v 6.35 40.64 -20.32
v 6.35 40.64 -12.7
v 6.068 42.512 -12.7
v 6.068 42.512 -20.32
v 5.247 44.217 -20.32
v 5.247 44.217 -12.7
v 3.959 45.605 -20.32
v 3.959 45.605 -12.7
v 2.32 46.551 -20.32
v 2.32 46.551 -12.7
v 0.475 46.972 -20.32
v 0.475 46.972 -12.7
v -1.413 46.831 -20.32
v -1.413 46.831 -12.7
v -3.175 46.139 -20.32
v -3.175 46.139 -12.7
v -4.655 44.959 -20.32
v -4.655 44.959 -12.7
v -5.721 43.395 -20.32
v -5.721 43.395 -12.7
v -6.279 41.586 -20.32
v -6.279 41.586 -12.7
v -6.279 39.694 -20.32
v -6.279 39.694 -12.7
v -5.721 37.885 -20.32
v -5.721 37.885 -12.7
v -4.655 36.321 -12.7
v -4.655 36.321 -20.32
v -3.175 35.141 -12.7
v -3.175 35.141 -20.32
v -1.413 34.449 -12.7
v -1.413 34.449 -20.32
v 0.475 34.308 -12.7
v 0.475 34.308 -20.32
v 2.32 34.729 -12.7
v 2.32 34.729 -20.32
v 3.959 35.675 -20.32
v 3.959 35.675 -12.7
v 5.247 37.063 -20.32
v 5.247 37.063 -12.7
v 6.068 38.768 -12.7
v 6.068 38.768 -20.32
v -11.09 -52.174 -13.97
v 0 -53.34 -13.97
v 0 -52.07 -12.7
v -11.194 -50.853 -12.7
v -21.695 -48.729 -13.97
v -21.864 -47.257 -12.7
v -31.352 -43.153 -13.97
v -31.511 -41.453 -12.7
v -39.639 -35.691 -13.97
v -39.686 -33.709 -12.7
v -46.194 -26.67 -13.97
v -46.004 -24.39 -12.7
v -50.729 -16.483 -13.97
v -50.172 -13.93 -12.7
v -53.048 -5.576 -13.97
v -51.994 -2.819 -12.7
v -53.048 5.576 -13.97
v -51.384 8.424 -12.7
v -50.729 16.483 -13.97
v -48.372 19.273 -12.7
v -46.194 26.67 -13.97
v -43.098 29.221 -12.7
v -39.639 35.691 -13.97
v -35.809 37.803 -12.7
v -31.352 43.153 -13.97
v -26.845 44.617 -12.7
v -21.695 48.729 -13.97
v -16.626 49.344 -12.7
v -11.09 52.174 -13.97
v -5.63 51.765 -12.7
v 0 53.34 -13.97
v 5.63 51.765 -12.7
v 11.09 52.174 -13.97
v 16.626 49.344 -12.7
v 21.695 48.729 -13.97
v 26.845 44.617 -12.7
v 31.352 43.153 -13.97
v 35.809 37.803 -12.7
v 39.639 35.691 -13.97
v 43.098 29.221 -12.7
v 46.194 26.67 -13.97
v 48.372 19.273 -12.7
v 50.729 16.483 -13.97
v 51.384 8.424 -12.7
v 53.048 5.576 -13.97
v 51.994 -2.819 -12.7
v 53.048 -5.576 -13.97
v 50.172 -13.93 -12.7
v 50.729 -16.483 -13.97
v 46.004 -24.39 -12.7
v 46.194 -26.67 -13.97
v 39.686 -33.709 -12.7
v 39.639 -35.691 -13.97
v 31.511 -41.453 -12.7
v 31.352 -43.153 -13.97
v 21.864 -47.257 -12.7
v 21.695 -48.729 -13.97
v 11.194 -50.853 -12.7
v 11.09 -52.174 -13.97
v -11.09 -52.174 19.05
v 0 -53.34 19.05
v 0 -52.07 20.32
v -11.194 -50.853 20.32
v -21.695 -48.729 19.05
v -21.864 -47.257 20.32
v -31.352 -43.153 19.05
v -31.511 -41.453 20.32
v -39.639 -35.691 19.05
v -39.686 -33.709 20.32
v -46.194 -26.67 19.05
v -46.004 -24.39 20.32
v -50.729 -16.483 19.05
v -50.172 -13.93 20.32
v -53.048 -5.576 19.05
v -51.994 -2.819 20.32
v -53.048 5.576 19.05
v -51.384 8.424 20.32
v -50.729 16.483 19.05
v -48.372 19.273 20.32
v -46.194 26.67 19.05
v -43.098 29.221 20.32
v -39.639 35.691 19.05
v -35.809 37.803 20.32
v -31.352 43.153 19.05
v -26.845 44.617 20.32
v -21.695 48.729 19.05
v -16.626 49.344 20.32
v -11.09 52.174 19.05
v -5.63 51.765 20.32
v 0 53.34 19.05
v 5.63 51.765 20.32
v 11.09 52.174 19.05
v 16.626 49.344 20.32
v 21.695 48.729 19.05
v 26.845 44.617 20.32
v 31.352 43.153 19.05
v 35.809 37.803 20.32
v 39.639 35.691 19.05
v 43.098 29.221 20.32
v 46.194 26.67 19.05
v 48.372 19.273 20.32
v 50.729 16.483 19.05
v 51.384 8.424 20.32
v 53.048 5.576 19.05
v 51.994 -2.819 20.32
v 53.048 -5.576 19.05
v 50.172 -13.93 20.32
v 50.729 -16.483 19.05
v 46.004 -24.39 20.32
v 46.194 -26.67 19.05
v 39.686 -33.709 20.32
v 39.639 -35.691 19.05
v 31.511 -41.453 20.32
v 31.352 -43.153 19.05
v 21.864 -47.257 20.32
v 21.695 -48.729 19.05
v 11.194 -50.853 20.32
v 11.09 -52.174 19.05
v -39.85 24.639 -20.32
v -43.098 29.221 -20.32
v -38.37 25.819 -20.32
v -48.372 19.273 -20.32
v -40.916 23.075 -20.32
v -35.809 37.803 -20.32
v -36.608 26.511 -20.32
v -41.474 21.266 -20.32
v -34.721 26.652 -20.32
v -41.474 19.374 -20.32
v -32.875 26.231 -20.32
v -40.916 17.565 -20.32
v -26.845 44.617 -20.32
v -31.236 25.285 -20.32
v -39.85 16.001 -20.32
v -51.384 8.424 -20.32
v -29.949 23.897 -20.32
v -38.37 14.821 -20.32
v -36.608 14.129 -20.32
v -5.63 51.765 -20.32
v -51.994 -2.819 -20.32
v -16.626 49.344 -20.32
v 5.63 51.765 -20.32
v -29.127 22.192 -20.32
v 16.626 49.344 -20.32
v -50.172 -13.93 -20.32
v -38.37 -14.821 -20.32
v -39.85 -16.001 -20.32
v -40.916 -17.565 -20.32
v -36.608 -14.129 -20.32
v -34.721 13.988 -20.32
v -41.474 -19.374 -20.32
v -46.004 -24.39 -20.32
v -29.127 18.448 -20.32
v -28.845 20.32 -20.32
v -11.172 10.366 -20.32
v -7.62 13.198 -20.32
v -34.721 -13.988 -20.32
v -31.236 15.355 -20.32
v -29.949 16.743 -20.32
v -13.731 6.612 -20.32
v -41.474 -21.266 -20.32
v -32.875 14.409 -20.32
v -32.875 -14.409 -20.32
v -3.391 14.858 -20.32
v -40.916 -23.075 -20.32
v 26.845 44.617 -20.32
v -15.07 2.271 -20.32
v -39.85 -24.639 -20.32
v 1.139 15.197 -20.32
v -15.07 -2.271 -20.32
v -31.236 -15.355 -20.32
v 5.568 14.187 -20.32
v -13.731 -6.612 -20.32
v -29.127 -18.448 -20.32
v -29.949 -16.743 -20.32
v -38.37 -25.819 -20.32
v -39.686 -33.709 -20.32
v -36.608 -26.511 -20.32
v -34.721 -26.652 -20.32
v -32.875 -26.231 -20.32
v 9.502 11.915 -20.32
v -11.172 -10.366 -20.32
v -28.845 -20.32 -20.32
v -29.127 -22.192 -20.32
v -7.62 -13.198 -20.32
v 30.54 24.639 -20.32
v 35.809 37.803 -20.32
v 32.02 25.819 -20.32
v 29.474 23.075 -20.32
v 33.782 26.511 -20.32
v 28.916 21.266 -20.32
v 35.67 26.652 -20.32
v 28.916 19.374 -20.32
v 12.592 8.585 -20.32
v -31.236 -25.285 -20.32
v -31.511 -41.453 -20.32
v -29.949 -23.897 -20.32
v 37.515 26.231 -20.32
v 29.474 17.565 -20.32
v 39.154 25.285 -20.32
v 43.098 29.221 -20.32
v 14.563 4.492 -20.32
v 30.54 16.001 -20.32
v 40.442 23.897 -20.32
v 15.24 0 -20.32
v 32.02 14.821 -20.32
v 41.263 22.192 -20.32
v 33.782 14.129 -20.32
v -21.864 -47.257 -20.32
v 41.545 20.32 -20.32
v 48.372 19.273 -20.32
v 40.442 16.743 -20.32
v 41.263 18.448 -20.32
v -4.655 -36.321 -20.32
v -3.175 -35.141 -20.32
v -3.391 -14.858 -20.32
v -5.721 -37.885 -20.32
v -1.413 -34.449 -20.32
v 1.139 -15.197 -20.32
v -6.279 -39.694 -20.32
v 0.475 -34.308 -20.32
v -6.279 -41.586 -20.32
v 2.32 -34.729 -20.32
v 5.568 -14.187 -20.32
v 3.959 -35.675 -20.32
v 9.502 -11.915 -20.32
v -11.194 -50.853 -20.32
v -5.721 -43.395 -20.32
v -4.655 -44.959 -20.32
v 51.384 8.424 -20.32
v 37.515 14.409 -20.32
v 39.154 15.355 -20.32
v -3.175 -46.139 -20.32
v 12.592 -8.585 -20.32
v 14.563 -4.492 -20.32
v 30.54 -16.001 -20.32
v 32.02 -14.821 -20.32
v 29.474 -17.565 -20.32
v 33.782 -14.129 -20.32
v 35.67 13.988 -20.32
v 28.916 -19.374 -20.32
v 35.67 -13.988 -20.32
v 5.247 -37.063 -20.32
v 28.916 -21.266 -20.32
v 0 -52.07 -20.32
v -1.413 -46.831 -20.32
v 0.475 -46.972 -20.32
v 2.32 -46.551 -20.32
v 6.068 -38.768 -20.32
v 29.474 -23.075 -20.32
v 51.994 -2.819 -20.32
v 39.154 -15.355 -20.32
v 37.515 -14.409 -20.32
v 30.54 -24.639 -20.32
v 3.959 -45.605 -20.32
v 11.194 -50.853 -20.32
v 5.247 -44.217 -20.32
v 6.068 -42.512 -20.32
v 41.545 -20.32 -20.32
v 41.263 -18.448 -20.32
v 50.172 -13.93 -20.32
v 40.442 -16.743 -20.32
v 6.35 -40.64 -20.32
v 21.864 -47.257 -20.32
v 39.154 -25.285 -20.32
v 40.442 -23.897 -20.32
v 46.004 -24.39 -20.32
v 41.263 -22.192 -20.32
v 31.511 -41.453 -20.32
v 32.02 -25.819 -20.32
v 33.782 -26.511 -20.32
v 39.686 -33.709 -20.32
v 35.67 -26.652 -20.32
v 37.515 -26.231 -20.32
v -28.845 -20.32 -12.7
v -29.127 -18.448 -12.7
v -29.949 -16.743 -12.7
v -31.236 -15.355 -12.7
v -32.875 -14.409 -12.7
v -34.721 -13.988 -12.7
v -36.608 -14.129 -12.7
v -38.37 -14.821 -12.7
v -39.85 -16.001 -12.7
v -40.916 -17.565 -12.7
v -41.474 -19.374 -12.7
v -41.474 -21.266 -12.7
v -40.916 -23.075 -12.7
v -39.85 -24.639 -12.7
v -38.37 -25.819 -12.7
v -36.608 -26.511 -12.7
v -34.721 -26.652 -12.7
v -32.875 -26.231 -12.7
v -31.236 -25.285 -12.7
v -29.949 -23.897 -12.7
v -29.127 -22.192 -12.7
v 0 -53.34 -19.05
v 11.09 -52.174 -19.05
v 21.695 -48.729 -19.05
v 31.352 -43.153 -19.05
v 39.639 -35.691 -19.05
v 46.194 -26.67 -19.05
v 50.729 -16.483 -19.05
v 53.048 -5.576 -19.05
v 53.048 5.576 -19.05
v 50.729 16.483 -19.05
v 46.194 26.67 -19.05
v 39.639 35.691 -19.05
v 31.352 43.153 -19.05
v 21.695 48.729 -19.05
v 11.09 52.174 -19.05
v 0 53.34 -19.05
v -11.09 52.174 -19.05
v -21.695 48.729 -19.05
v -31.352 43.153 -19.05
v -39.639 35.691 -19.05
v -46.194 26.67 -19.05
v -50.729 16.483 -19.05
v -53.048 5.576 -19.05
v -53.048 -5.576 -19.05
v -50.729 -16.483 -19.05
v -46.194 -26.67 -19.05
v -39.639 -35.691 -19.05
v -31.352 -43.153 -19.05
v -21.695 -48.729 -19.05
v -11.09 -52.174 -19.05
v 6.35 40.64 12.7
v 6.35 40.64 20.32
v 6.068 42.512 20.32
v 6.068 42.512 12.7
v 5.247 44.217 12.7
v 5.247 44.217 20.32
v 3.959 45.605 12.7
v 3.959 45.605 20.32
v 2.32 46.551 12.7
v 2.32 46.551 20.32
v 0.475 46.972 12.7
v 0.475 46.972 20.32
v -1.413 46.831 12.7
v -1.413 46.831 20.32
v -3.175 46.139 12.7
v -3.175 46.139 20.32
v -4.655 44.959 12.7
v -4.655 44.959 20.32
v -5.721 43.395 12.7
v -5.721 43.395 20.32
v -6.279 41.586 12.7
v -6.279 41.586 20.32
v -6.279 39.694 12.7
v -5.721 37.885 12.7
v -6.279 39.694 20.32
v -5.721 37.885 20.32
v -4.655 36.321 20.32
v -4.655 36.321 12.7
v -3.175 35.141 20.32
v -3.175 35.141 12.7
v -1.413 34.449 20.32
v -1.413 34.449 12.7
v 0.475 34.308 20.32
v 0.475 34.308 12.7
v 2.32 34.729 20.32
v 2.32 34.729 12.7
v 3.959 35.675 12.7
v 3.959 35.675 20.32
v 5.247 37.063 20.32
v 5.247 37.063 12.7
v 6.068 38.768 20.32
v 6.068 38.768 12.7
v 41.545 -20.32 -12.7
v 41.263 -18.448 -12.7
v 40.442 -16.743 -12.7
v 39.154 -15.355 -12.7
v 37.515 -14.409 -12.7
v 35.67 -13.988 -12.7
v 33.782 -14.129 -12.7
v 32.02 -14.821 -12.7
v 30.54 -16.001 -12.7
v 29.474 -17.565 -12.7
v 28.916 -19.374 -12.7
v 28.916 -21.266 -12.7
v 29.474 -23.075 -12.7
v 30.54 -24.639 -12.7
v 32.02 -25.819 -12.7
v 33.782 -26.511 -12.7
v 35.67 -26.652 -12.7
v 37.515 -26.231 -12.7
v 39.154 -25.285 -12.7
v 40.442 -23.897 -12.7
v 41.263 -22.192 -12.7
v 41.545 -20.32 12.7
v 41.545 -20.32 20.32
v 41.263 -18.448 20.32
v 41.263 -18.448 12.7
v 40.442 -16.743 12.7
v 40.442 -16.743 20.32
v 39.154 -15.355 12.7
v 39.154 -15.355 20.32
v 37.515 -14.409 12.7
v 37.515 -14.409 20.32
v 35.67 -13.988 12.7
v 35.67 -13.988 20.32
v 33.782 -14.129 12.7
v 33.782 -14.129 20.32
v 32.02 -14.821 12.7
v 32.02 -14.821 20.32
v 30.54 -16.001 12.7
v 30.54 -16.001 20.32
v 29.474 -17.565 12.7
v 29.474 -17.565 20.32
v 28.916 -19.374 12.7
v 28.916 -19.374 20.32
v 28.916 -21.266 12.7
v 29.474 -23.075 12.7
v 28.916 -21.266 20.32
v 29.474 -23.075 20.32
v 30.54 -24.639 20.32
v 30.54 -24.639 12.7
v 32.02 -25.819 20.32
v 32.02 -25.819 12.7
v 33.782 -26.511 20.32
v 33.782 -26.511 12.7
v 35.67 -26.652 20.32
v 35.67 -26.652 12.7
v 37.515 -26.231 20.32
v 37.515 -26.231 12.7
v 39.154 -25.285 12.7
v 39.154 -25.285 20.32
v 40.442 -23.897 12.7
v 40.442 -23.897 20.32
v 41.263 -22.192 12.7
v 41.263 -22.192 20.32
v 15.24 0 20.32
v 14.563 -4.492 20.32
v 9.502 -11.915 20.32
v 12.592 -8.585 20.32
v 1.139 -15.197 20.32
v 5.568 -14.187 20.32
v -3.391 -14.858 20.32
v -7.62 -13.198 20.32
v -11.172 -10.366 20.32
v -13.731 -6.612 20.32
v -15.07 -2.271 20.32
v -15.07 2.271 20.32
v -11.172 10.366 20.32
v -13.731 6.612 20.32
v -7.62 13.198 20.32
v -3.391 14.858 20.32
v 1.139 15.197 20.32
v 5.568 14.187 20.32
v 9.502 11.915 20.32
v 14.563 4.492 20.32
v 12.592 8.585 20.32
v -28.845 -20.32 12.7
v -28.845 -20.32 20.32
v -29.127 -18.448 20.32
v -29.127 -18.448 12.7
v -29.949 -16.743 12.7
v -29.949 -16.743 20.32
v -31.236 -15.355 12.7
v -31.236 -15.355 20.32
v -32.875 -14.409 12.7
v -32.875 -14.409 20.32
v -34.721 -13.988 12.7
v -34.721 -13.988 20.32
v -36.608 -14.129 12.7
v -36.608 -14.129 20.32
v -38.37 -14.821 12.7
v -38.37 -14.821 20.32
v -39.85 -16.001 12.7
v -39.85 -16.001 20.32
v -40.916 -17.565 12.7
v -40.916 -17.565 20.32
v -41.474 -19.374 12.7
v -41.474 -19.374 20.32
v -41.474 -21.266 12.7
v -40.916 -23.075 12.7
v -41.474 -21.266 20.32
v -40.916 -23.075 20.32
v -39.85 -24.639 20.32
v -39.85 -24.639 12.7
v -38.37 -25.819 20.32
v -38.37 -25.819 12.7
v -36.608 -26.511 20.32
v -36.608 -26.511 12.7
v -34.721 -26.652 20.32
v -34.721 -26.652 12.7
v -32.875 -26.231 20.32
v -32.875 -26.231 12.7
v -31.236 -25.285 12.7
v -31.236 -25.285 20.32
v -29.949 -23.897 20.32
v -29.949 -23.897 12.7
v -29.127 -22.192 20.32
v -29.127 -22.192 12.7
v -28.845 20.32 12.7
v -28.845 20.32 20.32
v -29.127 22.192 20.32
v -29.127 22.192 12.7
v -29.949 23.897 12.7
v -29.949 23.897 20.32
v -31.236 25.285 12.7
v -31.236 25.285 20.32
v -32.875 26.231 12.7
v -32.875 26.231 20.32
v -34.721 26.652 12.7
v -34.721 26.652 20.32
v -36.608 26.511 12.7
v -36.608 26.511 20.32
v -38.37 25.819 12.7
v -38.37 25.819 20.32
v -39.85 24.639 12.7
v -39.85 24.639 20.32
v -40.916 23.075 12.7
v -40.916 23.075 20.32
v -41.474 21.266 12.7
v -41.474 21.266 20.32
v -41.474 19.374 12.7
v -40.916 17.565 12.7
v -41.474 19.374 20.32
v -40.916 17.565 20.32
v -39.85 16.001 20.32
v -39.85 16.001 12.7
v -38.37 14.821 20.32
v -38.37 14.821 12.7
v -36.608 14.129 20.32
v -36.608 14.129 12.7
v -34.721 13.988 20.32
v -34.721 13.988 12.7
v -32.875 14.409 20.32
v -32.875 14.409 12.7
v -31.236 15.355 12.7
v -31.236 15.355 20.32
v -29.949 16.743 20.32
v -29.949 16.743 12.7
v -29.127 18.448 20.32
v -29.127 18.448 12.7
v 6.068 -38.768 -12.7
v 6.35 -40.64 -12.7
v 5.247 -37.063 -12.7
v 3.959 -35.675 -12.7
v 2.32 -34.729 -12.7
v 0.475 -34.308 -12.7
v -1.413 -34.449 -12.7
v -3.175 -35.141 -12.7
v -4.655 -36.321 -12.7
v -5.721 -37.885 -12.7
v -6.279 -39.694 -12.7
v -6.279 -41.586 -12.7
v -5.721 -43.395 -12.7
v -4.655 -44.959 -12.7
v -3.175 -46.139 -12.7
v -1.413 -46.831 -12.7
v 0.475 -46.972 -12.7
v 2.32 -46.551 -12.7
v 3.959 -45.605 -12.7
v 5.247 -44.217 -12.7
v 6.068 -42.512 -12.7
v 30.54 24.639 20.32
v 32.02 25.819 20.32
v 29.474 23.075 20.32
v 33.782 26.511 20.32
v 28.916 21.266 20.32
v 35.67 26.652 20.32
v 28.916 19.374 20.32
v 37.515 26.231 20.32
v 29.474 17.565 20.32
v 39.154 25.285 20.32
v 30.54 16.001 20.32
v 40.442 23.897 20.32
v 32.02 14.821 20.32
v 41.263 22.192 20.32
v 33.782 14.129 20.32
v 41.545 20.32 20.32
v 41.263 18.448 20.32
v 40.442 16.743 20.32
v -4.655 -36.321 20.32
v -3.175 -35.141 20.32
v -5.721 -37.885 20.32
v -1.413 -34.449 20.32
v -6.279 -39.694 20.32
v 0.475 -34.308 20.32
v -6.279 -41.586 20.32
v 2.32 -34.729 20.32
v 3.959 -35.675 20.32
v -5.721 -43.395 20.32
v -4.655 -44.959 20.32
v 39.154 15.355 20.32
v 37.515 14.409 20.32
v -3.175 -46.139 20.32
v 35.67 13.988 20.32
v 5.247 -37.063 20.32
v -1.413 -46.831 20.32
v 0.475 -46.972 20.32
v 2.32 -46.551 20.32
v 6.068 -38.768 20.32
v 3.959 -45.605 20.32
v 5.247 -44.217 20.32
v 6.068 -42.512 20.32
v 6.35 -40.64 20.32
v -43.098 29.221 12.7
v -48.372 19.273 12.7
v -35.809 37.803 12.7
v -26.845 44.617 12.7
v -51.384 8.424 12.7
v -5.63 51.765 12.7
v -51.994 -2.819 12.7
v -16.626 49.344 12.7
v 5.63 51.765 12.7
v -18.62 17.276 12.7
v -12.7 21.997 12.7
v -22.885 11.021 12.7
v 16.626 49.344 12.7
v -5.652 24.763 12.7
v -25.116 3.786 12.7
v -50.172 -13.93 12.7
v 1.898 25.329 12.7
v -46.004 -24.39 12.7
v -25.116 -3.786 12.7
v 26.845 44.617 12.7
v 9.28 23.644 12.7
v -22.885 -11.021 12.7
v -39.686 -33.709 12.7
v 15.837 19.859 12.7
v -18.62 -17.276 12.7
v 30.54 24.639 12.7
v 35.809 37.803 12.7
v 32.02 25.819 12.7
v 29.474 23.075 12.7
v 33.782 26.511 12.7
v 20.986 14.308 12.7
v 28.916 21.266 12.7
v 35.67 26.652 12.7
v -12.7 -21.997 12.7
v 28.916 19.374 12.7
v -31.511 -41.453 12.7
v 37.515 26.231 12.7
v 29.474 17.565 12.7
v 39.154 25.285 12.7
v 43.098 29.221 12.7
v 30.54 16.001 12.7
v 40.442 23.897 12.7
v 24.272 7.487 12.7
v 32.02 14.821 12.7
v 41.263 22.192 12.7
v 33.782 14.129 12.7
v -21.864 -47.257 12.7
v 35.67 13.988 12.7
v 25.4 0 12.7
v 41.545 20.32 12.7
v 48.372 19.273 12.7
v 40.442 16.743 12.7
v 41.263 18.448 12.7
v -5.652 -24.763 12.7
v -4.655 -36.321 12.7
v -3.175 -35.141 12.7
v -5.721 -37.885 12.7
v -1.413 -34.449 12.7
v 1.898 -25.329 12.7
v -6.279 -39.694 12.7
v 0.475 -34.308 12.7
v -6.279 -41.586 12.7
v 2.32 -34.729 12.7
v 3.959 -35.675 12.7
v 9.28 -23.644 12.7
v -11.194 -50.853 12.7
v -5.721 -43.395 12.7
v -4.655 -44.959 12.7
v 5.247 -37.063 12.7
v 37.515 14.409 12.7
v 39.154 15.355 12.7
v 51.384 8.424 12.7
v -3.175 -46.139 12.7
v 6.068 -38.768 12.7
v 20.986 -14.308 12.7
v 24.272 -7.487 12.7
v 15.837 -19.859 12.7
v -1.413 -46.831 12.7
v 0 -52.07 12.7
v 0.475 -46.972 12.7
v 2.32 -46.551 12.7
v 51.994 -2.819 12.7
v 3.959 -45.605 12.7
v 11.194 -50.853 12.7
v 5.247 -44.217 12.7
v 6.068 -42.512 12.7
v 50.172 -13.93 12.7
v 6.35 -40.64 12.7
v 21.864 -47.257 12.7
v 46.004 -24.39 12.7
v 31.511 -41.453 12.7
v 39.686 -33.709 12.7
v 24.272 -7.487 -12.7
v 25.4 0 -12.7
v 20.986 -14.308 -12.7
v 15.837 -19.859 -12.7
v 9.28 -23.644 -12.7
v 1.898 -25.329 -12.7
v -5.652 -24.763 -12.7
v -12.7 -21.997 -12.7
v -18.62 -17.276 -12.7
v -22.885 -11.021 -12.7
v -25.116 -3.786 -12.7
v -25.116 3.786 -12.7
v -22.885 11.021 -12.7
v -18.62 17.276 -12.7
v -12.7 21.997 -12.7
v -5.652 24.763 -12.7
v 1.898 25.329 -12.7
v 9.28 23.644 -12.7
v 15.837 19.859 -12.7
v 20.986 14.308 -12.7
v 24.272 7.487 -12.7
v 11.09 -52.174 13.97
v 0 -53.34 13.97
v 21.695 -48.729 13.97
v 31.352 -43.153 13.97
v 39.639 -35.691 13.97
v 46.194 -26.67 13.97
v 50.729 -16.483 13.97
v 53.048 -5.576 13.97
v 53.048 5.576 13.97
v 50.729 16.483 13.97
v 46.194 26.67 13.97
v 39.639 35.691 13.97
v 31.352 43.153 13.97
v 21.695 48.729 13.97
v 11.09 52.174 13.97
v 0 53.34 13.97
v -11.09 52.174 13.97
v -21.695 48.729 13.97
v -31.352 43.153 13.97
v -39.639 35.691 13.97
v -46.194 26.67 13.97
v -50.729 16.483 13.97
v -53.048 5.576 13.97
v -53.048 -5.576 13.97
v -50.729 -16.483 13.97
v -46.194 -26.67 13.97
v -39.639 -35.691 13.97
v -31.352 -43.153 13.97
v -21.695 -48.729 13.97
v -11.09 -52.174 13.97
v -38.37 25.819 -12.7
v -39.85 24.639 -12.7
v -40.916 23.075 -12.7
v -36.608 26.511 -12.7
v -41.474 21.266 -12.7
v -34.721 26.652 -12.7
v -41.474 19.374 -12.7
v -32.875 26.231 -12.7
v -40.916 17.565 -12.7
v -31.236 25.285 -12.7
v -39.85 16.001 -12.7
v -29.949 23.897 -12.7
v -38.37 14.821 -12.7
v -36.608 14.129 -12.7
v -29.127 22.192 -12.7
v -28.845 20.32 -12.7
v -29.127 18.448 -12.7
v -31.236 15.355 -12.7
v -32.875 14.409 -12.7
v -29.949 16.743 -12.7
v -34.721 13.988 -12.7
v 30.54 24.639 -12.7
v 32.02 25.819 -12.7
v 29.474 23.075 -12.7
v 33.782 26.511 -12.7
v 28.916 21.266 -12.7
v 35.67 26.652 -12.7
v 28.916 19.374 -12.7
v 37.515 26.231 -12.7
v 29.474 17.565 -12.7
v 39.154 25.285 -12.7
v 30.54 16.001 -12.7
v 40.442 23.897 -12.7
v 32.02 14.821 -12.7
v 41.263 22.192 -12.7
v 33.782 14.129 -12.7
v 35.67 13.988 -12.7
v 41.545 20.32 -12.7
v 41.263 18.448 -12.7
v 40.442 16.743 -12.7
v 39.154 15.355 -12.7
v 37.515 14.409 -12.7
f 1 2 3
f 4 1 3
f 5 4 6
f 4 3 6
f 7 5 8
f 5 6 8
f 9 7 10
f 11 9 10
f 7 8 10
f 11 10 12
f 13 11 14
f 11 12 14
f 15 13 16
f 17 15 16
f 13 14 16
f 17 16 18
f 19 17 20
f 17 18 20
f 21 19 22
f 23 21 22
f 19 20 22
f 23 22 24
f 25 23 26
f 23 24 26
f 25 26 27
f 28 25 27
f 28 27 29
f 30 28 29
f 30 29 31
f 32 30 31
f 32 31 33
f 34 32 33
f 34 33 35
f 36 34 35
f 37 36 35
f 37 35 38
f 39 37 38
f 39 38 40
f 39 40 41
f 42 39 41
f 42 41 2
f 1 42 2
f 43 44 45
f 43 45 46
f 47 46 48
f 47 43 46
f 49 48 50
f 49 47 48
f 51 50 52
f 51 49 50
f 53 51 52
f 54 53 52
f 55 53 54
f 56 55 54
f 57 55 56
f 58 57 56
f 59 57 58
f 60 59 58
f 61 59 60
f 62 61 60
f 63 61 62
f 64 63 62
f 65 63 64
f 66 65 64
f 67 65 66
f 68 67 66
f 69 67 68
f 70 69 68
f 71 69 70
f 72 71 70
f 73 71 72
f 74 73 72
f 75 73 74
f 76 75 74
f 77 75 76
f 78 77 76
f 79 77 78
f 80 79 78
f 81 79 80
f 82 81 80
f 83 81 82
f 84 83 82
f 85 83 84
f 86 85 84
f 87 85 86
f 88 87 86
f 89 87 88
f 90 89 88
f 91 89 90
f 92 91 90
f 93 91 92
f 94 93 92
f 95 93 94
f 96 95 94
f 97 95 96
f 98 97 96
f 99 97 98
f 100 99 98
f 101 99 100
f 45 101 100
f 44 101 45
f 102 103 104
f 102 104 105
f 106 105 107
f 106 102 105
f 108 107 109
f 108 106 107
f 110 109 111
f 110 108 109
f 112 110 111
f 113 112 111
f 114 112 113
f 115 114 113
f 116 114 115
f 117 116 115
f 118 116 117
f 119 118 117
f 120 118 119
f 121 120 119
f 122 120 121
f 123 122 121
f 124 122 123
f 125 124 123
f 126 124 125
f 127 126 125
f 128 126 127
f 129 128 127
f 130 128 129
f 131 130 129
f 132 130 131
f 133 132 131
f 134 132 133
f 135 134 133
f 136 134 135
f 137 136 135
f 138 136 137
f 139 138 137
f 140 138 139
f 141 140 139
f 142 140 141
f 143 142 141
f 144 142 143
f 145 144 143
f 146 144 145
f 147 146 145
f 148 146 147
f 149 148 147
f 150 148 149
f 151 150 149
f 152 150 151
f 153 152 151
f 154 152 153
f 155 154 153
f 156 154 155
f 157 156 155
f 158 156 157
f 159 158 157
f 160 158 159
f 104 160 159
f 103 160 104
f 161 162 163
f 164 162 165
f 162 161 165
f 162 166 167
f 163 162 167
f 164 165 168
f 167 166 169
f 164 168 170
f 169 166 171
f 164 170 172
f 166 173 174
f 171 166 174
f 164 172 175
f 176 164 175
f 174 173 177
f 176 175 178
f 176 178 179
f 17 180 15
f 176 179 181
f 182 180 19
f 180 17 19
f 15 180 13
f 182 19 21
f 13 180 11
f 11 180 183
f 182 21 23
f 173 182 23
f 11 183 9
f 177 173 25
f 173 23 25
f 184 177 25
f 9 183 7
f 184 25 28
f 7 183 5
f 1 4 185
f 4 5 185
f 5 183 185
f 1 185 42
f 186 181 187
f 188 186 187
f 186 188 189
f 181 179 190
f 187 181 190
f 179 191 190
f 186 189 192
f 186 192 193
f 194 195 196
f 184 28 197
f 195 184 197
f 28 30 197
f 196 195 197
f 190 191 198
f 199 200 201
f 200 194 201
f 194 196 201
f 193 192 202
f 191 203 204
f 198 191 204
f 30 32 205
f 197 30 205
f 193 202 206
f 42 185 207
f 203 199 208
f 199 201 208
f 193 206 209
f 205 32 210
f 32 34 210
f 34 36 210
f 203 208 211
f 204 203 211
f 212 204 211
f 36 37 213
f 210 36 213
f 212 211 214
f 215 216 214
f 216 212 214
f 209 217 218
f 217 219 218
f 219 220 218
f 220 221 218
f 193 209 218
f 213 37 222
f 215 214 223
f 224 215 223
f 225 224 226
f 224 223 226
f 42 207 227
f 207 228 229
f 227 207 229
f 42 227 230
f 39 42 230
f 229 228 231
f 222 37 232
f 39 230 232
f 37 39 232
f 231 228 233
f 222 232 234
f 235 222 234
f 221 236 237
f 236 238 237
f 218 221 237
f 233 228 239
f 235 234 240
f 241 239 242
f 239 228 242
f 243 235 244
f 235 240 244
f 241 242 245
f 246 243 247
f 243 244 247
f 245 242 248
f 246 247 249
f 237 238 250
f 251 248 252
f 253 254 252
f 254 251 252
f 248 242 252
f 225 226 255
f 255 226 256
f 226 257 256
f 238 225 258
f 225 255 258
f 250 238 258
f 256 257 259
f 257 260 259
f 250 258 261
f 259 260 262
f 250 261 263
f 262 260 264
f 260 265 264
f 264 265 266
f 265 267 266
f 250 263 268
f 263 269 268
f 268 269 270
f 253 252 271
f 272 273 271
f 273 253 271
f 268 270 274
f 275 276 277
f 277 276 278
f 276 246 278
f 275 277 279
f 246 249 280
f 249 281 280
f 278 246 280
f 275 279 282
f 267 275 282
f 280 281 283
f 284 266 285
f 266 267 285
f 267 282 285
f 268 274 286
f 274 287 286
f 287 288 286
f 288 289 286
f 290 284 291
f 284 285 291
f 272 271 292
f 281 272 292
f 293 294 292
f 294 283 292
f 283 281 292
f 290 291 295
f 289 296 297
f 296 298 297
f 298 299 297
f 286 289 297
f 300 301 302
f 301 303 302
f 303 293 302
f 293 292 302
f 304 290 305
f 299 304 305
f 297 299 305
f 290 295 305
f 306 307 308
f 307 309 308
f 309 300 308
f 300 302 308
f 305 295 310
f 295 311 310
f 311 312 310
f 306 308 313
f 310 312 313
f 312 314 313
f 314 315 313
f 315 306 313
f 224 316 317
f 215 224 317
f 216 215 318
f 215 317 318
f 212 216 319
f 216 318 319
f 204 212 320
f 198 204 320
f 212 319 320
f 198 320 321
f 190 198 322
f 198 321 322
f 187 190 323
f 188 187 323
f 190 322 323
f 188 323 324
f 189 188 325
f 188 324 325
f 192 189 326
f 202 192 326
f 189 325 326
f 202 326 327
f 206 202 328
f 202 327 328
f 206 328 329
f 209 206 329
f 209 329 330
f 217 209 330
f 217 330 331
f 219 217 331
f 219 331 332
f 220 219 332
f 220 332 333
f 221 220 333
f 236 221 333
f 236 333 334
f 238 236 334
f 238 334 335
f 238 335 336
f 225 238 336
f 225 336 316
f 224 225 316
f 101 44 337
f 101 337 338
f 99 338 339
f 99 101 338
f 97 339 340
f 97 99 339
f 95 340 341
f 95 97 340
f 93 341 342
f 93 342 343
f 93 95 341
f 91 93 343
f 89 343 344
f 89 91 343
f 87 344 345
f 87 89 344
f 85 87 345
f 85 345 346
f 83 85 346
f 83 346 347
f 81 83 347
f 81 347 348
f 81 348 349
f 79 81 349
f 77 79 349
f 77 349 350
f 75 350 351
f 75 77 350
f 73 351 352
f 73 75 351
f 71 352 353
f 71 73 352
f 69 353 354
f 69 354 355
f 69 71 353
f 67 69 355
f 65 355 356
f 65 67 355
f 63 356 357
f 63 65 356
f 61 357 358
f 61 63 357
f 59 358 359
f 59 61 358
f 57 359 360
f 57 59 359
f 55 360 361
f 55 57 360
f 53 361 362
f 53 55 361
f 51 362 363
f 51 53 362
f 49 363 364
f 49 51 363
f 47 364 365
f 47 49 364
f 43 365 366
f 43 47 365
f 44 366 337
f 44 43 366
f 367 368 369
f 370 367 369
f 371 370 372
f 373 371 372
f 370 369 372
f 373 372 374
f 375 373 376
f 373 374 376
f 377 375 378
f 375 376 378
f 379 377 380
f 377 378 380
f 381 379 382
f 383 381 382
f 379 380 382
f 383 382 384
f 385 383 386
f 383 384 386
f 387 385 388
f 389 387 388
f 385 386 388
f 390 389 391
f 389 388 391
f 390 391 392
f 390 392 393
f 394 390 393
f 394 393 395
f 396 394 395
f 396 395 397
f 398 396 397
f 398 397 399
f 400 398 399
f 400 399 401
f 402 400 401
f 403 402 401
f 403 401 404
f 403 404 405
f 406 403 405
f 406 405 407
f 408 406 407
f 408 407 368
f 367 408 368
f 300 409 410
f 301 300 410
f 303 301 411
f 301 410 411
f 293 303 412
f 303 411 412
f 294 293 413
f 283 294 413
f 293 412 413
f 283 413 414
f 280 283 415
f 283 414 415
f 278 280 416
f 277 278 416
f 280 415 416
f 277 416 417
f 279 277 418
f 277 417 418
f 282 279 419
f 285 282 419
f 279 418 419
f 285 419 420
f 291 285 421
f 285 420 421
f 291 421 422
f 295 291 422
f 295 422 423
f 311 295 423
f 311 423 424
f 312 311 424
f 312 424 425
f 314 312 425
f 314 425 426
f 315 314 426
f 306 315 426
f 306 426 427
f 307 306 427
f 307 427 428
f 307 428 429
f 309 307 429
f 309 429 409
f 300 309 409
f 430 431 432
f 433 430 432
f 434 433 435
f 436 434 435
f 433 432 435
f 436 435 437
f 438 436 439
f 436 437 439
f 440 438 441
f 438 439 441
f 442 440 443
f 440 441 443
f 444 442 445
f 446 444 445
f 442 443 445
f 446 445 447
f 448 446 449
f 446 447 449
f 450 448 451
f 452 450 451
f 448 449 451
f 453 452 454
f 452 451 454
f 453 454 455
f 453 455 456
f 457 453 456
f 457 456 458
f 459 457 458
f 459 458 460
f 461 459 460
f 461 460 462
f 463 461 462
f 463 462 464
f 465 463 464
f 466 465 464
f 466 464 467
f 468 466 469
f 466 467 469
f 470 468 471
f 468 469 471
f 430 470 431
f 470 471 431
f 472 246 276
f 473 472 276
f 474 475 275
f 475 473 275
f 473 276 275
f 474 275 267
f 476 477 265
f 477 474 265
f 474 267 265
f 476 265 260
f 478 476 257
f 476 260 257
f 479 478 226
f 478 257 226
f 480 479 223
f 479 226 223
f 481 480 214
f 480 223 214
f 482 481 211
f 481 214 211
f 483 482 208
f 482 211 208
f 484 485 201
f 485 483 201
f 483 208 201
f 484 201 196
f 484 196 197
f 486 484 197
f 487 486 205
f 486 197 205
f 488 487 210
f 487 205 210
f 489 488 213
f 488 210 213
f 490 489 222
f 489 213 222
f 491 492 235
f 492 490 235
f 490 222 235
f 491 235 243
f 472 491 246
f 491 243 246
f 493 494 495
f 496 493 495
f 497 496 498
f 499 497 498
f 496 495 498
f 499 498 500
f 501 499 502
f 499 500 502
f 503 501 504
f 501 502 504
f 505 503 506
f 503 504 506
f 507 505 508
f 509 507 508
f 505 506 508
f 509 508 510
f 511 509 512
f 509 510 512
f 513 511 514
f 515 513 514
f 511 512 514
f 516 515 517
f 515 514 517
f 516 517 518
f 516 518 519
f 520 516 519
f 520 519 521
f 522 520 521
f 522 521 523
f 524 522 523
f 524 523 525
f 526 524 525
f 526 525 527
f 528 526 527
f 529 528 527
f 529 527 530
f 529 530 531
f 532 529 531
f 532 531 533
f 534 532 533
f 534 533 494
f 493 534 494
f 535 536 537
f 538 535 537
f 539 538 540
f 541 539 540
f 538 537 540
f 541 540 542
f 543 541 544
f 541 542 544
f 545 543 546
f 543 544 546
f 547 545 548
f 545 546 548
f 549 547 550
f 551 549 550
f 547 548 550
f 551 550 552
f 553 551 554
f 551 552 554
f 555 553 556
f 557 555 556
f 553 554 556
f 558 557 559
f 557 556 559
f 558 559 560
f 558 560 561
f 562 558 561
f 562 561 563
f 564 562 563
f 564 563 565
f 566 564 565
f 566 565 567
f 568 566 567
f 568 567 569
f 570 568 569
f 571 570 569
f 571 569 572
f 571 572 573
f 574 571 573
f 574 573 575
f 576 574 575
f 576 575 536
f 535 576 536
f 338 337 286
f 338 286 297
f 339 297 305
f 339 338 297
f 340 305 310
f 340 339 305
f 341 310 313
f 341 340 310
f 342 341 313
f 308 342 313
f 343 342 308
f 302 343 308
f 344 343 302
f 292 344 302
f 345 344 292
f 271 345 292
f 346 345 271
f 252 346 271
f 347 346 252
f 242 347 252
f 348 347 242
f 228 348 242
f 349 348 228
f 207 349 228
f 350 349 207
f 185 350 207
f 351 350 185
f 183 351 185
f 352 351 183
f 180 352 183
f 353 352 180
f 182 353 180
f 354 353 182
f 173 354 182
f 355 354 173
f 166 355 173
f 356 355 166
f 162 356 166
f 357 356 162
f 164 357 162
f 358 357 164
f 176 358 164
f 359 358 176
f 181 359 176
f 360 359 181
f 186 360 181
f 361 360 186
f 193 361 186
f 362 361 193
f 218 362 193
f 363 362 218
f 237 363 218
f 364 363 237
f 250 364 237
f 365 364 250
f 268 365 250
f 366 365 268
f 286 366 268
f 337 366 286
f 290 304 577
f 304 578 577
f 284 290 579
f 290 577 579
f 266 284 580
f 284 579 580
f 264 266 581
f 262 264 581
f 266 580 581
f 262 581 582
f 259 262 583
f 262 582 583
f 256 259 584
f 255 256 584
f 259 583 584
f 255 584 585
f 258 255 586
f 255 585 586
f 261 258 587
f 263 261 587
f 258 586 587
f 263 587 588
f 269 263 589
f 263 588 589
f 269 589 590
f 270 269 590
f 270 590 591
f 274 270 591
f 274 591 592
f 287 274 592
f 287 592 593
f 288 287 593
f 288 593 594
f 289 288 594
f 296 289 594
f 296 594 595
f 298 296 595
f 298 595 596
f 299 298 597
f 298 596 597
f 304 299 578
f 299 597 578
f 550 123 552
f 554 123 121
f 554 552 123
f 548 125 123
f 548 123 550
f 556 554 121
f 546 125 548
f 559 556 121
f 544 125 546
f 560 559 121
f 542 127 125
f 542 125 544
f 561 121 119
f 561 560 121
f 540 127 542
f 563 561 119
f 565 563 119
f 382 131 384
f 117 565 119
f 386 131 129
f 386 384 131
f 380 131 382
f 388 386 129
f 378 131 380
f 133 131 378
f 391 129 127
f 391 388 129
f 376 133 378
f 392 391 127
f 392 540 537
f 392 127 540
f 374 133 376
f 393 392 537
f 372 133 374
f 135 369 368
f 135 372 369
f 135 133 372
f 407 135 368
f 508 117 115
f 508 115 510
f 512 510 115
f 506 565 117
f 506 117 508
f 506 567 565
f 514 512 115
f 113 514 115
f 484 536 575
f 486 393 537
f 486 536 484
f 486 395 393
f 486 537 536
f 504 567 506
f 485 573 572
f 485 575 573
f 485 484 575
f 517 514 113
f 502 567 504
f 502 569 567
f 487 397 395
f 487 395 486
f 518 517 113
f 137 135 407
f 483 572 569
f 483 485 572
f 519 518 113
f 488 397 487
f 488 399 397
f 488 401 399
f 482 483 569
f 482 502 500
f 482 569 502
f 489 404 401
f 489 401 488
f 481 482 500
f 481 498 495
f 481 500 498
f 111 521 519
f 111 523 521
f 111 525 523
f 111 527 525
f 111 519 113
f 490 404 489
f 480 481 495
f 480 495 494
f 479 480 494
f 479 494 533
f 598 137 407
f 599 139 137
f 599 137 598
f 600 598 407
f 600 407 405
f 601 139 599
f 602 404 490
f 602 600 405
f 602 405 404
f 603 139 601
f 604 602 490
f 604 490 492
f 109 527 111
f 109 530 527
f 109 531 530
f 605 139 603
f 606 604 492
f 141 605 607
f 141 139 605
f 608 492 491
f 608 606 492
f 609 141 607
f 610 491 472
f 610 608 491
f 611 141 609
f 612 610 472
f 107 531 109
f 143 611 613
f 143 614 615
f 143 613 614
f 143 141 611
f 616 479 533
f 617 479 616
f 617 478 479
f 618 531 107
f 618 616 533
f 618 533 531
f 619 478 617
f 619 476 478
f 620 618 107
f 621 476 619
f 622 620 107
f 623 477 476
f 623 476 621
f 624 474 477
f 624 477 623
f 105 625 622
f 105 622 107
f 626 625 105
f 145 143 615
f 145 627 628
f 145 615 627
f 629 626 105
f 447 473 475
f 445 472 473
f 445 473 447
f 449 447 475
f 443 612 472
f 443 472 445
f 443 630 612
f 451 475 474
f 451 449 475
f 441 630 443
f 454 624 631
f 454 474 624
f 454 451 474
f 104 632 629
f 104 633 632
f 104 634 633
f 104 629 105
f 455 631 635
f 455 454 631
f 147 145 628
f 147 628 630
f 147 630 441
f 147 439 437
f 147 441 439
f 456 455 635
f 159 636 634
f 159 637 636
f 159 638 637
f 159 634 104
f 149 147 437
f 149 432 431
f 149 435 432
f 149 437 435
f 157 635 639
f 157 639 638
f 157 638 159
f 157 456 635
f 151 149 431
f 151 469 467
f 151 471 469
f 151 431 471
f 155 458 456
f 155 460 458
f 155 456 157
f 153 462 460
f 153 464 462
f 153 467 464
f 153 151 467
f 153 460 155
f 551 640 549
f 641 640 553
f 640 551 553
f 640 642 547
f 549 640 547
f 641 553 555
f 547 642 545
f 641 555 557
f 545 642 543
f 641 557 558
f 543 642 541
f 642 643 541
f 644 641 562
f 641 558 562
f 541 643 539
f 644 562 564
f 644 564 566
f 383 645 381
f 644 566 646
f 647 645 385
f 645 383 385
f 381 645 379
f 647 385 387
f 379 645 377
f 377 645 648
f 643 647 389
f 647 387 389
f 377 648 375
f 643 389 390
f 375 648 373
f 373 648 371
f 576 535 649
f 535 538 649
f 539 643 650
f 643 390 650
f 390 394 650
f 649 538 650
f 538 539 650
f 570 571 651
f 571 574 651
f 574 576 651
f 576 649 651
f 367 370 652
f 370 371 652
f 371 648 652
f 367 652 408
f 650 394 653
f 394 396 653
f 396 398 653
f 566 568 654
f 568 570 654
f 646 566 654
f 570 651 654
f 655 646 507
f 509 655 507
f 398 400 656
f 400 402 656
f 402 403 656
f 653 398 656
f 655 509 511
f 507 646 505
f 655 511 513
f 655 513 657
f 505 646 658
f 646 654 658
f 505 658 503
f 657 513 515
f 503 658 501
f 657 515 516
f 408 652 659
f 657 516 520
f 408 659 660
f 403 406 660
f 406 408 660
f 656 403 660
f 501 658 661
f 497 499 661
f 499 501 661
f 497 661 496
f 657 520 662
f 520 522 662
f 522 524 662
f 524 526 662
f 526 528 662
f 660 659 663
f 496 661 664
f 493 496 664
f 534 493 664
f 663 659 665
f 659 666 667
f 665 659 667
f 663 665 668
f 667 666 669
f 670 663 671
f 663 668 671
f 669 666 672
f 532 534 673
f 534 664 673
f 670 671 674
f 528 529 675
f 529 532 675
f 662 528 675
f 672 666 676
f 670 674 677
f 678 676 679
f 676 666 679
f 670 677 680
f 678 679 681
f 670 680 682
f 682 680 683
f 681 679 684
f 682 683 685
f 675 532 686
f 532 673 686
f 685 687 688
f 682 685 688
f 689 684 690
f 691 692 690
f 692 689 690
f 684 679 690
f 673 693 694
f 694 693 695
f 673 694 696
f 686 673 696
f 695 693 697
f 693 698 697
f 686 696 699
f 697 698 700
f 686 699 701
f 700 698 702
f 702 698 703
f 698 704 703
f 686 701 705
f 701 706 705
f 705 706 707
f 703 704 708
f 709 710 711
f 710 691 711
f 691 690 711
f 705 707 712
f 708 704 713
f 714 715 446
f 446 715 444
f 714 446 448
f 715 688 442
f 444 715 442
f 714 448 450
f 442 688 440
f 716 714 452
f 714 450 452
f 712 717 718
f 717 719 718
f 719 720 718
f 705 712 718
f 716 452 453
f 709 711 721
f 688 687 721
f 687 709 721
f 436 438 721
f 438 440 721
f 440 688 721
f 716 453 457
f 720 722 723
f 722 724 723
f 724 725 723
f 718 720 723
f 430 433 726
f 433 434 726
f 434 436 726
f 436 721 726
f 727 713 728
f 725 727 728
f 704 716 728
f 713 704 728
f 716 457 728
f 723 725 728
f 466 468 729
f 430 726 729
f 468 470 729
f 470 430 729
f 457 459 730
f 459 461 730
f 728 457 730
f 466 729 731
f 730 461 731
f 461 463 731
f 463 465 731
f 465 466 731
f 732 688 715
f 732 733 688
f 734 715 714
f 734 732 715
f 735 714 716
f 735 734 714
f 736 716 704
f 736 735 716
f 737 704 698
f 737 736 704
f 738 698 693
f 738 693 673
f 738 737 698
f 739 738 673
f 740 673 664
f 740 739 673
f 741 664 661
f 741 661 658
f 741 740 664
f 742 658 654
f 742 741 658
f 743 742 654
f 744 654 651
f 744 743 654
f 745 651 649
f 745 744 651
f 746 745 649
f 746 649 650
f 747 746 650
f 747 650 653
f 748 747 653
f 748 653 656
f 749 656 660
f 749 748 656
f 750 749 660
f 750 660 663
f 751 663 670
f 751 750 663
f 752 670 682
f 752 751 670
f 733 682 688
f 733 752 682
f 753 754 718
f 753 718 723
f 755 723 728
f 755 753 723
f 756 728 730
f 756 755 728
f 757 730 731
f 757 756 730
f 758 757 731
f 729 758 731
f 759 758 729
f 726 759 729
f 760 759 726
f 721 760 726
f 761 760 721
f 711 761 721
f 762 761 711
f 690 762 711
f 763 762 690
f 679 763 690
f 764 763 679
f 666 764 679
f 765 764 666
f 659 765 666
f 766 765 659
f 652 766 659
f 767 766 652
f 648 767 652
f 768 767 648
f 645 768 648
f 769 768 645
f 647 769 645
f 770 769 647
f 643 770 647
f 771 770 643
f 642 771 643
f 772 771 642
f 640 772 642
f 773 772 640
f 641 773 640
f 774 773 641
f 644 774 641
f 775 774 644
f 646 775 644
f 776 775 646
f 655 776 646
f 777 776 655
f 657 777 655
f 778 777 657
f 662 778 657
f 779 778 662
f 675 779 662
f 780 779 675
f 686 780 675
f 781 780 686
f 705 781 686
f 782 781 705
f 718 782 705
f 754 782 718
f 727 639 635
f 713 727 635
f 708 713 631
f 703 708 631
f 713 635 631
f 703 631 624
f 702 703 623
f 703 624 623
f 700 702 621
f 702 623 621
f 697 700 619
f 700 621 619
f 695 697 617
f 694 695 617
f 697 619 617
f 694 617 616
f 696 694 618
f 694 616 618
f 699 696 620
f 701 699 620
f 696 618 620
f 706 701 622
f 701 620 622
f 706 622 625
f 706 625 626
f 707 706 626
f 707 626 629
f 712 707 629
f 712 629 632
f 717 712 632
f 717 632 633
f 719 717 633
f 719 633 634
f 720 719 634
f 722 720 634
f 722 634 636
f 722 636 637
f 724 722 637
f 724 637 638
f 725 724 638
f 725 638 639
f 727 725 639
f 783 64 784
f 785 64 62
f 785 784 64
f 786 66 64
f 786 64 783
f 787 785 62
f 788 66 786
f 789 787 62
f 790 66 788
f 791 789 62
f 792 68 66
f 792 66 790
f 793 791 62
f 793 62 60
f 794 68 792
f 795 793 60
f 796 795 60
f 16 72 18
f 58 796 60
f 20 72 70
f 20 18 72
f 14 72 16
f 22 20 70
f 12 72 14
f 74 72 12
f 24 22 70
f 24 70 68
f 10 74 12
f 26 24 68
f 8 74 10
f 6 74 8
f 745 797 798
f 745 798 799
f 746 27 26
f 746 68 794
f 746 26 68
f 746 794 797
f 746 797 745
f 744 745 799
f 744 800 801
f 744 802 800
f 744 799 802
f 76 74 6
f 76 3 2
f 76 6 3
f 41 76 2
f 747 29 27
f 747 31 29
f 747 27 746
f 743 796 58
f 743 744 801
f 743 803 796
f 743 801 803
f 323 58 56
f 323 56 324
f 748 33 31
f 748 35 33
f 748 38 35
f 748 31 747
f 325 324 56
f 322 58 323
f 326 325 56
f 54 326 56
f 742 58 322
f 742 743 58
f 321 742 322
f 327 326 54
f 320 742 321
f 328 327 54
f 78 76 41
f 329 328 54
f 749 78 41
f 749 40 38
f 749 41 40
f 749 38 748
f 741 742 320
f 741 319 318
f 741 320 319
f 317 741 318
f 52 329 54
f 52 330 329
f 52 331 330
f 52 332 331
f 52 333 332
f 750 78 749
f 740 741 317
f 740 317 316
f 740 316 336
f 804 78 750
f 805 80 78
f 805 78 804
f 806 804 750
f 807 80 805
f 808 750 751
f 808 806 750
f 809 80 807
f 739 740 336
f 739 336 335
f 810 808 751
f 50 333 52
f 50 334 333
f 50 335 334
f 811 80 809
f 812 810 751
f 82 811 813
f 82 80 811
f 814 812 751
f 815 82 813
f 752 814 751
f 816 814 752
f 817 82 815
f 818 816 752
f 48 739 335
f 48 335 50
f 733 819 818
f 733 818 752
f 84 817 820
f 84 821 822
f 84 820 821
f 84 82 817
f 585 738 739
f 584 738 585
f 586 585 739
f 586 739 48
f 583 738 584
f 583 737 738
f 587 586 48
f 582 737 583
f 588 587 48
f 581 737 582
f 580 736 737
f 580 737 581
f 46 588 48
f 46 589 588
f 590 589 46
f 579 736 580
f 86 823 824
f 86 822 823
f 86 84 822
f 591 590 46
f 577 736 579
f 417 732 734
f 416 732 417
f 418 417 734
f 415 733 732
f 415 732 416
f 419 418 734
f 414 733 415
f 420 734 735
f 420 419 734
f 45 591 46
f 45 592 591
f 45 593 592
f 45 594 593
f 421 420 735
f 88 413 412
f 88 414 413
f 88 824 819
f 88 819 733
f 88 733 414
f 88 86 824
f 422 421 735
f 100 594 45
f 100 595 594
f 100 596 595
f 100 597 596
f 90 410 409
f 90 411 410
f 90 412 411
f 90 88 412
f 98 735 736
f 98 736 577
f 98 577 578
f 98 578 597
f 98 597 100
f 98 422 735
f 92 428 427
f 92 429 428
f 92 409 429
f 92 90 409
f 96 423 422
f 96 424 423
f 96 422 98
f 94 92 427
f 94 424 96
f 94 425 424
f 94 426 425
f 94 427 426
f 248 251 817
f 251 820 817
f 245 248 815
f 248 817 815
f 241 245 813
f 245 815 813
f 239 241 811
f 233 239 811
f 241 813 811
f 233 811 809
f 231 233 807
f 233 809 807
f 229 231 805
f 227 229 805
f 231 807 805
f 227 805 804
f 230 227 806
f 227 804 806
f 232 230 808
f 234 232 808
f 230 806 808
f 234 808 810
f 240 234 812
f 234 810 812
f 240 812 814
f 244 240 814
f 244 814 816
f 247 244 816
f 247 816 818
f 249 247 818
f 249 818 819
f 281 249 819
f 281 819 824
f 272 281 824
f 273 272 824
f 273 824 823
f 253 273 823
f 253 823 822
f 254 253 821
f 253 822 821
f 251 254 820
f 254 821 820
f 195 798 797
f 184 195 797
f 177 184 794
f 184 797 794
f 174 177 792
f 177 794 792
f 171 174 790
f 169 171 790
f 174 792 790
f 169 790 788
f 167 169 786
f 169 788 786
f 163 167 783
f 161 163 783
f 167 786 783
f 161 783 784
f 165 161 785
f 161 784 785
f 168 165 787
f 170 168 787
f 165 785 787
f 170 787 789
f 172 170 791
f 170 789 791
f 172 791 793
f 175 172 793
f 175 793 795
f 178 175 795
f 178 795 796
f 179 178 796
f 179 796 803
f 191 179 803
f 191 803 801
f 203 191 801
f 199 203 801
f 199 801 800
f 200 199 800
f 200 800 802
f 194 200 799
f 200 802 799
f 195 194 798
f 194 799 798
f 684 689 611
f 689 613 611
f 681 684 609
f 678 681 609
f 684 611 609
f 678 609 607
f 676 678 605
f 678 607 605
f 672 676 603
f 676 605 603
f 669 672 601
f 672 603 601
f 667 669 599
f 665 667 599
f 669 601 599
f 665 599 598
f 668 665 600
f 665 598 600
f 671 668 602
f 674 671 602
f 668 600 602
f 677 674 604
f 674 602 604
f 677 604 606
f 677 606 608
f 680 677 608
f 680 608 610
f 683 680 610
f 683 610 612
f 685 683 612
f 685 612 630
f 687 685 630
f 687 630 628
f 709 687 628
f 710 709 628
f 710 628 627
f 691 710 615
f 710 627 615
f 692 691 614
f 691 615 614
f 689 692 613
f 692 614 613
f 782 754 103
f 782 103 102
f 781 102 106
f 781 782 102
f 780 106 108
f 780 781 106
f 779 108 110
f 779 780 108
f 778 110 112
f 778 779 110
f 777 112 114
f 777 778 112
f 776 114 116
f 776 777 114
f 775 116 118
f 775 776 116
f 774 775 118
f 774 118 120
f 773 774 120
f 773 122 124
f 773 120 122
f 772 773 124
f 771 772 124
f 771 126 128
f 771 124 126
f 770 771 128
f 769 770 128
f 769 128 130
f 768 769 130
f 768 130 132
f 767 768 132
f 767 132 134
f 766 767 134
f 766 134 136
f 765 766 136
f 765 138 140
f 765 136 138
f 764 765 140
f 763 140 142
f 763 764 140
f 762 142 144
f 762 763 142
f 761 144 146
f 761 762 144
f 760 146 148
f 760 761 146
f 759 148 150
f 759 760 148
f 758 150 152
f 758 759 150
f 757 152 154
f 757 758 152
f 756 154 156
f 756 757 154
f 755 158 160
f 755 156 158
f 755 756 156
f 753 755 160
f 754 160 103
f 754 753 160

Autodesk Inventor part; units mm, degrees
ref_plane "YZ Plane" through (0, 0, 0) normal (1, 0, 0) x (0, 1, 0)
ref_plane "XZ Plane" through (0, 0, 0) normal (0, 1, 0) x (-1, 0, 0)
ref_plane "XY Plane" through (0, 0, 0) normal (0, 0, 1) x (1, 0, 0)
sketch "Sketch1" plane through (0, 0, 0) normal (0, 0, 1) x (1, 0, 0)
  circle A0 centre (0, 0) radius 15.24
  circle A1 centre (0, 0) radius 25.4
  dimension "d0" = 30.48
  dimension "d1" = 50.8
extrude "Extrusion1" add sketch "Sketch1" along normal mid plane 40.64
sketch "Sketch2" plane through (0, 0, 0) normal (1, 0, 0) x (0, 1, 0)
  line L0 (25.4, -20.32) -> (15.24, -20.32) projected
  line L1 (15.24, -20.32) -> (15.24, 20.32) projected
  line L2 (15.24, 20.32) -> (25.4, 20.32) projected
  line L3 (25.4, 20.32) -> (25.4, -20.32) projected
  line L4 (-15.24, -20.32) -> (-25.4, -20.32) projected
  line L5 (-25.4, -20.32) -> (-25.4, 20.32) projected
  line L6 (-25.4, 20.32) -> (-15.24, 20.32) projected
  line L7 (-15.24, 20.32) -> (-15.24, -20.32) projected
  line L8 (25.4, -20.32) -> (15.24, -20.32) projected
  line L9 (15.24, -20.32) -> (15.24, 20.32) projected
  line L10 (15.24, 20.32) -> (25.4, 20.32) projected
  line L11 (25.4, 20.32) -> (25.4, -20.32) projected
  line L12 (-15.24, -20.32) -> (-25.4, -20.32) projected
  line L13 (-25.4, -20.32) -> (-25.4, 20.32) projected
  line L14 (-25.4, 20.32) -> (-15.24, 20.32) projected
  line L15 (-15.24, 20.32) -> (-15.24, -20.32) projected
  line L16 (-25.4, -20.32) -> (25.4, -20.32) projected
  line L17 (25.4, 20.32) -> (-25.4, 20.32) projected
  line L18 (-25.4, -20.32) -> (-53.34, -20.32)
  line L19 (-53.34, -20.32) -> (-53.34, -12.7)
  line L20 (-53.34, -12.7) -> (-25.4, -12.7)
  line L21 (-25.4, -12.7) -> (-25.4, -20.32)
  line L22 (25.4, 20.32) -> (-25.4, 20.32) projected
  line L23 (-25.4, 20.32) -> (-53.34, 20.32)
  line L24 (-53.34, 20.32) -> (-53.34, 12.7)
  line L25 (-53.34, 12.7) -> (-25.4, 12.7)
  line L26 (-25.4, 12.7) -> (-25.4, 20.32)
  line L27 (0, -28.448) -> (0, 28.448) projected
  point P0 (0, 0)
  dimension "d4" = 27.94
  dimension "d5" = 7.62
  dimension "d6" = 27.94
  dimension "d7" = 7.62
revolve "Revolution1" add sketch "Sketch2" angle 360 about axis through (0, 0, -10) along (0, 0, 1) contours L18 L19 L20 L5 | L5 L25 L24 L23
chamfer "Chamfer1" distance 1.27 angle 45 1 edges at (0, 53.34, -20.32) measured on face at (-31.6257, -42.9531, -15.24)
chamfer "Chamfer2" distance 1.27 angle 45 1 edges at (0, 53.34, -12.7) measured on face at (-31.6257, -42.9531, -14.8167)
chamfer "Chamfer3" distance 1.27 angle 45 2 edges at (0, 53.34, 20.32) (0, 53.34, 12.7) measured on face at (-31.6257, -42.9531, 17.78)
sketch "Sketch3" plane through (0, 0, 20.32) normal (0, 0, 1) x (1, 0, 0)
  circle A0 centre (0, 0) radius 40.64 construction
  circle A1 centre (0, 40.64) radius 6.35
  circle A2 centre (-35.1953, 20.32) radius 6.35
  circle A3 centre (-35.1953, -20.32) radius 6.35
  circle A4 centre (0, -40.64) radius 6.35
  circle A5 centre (35.1953, -20.32) radius 6.35
  circle A6 centre (35.1953, 20.32) radius 6.35
  dimension "d18" = 81.28
  dimension "d19" = 12.7
  dimension "d22" = 360
extrude "Extrusion2" cut sketch "Sketch3" against normal through all
equation "\"BendRadius\" = Thickness"
equation "\"BendReliefWidth\" = Thickness"
equation "\"BendReliefDepth\" = 0.5 * Thickness"
equation "\"CornerReliefSize\" = 4 * Thickness"
equation "\"MinimumRemnant\" = 2 * Thickness"
equation "\"TransitionRadius\" = BendRadius"
equation "\"JacobiRadiusSize\" = BendRadius"
equation "\"GapSize\" = Thickness"
equation "\"Thickness\" = 3.048"
properties part number "connecting rod hub" material "Brass, Soft Yellow"
